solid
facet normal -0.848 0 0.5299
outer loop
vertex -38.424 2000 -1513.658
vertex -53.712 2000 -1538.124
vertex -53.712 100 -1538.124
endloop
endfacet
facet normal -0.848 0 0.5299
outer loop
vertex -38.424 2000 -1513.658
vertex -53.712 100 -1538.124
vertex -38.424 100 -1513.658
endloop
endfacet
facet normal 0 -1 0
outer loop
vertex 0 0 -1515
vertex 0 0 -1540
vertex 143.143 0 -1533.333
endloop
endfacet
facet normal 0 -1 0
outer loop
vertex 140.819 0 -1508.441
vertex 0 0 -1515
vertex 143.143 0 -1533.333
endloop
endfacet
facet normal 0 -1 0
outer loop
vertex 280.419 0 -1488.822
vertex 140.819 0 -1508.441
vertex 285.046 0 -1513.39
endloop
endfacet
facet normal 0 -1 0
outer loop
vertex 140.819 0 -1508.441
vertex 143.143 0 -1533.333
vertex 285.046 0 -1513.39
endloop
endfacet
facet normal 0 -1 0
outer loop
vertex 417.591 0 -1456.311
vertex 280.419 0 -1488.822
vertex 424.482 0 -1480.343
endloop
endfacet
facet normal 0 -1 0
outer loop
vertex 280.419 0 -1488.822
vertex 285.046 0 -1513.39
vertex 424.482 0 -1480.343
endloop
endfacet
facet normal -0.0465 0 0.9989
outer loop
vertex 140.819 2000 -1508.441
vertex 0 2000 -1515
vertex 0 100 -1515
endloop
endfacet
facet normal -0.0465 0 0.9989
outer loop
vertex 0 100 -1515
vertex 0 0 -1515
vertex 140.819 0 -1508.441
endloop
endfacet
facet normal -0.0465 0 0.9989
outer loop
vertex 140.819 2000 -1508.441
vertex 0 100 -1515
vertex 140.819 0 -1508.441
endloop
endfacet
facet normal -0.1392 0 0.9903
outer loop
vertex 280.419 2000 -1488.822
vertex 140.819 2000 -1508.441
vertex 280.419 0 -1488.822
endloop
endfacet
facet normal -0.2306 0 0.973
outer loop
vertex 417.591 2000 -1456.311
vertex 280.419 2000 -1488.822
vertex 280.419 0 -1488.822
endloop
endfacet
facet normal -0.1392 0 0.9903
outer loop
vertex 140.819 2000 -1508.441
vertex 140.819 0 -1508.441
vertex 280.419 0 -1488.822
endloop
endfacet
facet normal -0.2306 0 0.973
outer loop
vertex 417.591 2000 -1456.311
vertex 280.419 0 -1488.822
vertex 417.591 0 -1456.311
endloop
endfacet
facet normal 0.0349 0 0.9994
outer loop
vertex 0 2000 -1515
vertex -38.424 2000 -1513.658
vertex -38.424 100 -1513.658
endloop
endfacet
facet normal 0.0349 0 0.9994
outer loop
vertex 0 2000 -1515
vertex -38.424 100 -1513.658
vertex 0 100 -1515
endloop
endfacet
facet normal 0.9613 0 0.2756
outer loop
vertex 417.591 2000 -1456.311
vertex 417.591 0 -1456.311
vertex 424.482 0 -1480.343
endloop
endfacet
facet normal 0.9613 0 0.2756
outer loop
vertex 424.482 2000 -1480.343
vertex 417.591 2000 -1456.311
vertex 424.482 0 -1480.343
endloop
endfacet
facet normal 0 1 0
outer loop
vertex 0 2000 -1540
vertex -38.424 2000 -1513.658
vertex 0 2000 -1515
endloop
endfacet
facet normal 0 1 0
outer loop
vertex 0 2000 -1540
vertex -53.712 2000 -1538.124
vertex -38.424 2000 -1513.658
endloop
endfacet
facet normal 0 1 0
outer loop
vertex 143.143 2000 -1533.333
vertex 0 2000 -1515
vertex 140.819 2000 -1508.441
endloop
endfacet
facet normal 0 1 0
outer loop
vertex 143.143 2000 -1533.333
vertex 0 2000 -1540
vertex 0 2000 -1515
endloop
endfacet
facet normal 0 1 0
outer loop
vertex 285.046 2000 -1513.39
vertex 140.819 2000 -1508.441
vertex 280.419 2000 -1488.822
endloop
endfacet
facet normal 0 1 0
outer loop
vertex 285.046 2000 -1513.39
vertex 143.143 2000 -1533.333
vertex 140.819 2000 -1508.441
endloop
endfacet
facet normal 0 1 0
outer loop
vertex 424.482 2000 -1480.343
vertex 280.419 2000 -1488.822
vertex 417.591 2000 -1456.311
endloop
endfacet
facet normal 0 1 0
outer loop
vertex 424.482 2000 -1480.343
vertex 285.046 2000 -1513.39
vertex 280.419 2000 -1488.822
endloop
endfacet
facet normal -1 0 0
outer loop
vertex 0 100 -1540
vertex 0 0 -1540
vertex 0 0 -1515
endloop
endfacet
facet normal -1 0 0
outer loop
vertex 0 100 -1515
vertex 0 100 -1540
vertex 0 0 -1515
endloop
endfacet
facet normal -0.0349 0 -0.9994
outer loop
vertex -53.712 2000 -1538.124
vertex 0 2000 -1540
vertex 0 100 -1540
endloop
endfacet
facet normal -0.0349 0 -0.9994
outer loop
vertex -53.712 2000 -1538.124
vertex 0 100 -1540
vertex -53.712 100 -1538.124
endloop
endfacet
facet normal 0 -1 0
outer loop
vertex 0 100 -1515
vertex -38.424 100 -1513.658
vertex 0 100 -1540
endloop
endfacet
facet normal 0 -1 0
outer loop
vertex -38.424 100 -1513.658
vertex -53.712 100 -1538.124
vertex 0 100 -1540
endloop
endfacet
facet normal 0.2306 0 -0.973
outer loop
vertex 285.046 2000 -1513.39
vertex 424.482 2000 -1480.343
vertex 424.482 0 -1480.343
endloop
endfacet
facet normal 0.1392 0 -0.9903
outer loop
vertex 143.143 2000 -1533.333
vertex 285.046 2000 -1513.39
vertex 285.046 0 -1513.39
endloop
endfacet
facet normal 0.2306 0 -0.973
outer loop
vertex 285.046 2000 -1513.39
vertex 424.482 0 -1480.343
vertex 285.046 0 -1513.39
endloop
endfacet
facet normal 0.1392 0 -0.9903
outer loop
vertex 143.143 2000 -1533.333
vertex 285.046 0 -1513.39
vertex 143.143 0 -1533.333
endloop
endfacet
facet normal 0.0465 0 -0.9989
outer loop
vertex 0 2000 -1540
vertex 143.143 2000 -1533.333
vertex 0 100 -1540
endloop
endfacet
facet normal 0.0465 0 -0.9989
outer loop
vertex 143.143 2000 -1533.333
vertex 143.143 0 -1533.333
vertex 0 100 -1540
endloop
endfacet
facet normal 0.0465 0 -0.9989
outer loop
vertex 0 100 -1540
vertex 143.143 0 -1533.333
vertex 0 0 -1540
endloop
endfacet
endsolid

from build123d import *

# Parameters (mm, degrees)
EXTRUDE_1_DEPTH = 2000
EXTRUDE_2_DEPTH = 1900


with BuildPart() as part:
    # 草图1 → 凸台-拉伸1 (new body)
    with BuildSketch(Plane(origin=(0, 0, 0), x_dir=(1, 0, 0), z_dir=(0, 1, 0))):
        with BuildLine():
            Line((0, 1540), (0, 1515))
            ThreePointArc((0, 1515), (210.847247954, 1500.256124143), (417.590594063, 1456.311469347))
            Line((417.590594063, 1456.311469347), (424.481527958, 1480.343011745))
            ThreePointArc((424.481527958, 1480.343011745), (214.326575478, 1525.012825862), (0, 1540))
        make_face()
    extrude(amount=EXTRUDE_1_DEPTH)

    # 草图2 → 凸台-拉伸2 (add)
    with BuildSketch(Plane(origin=(0, 2000, 0), x_dir=(1, 0, 0), z_dir=(0, 1, 0))):
        Polygon((-38.424352084, 1513.658192058), (0, 1515), (0, 1540), (-53.712484783, 1538.1243187), align=None)
    extrude(amount=-EXTRUDE_2_DEPTH)


solid = part.part
